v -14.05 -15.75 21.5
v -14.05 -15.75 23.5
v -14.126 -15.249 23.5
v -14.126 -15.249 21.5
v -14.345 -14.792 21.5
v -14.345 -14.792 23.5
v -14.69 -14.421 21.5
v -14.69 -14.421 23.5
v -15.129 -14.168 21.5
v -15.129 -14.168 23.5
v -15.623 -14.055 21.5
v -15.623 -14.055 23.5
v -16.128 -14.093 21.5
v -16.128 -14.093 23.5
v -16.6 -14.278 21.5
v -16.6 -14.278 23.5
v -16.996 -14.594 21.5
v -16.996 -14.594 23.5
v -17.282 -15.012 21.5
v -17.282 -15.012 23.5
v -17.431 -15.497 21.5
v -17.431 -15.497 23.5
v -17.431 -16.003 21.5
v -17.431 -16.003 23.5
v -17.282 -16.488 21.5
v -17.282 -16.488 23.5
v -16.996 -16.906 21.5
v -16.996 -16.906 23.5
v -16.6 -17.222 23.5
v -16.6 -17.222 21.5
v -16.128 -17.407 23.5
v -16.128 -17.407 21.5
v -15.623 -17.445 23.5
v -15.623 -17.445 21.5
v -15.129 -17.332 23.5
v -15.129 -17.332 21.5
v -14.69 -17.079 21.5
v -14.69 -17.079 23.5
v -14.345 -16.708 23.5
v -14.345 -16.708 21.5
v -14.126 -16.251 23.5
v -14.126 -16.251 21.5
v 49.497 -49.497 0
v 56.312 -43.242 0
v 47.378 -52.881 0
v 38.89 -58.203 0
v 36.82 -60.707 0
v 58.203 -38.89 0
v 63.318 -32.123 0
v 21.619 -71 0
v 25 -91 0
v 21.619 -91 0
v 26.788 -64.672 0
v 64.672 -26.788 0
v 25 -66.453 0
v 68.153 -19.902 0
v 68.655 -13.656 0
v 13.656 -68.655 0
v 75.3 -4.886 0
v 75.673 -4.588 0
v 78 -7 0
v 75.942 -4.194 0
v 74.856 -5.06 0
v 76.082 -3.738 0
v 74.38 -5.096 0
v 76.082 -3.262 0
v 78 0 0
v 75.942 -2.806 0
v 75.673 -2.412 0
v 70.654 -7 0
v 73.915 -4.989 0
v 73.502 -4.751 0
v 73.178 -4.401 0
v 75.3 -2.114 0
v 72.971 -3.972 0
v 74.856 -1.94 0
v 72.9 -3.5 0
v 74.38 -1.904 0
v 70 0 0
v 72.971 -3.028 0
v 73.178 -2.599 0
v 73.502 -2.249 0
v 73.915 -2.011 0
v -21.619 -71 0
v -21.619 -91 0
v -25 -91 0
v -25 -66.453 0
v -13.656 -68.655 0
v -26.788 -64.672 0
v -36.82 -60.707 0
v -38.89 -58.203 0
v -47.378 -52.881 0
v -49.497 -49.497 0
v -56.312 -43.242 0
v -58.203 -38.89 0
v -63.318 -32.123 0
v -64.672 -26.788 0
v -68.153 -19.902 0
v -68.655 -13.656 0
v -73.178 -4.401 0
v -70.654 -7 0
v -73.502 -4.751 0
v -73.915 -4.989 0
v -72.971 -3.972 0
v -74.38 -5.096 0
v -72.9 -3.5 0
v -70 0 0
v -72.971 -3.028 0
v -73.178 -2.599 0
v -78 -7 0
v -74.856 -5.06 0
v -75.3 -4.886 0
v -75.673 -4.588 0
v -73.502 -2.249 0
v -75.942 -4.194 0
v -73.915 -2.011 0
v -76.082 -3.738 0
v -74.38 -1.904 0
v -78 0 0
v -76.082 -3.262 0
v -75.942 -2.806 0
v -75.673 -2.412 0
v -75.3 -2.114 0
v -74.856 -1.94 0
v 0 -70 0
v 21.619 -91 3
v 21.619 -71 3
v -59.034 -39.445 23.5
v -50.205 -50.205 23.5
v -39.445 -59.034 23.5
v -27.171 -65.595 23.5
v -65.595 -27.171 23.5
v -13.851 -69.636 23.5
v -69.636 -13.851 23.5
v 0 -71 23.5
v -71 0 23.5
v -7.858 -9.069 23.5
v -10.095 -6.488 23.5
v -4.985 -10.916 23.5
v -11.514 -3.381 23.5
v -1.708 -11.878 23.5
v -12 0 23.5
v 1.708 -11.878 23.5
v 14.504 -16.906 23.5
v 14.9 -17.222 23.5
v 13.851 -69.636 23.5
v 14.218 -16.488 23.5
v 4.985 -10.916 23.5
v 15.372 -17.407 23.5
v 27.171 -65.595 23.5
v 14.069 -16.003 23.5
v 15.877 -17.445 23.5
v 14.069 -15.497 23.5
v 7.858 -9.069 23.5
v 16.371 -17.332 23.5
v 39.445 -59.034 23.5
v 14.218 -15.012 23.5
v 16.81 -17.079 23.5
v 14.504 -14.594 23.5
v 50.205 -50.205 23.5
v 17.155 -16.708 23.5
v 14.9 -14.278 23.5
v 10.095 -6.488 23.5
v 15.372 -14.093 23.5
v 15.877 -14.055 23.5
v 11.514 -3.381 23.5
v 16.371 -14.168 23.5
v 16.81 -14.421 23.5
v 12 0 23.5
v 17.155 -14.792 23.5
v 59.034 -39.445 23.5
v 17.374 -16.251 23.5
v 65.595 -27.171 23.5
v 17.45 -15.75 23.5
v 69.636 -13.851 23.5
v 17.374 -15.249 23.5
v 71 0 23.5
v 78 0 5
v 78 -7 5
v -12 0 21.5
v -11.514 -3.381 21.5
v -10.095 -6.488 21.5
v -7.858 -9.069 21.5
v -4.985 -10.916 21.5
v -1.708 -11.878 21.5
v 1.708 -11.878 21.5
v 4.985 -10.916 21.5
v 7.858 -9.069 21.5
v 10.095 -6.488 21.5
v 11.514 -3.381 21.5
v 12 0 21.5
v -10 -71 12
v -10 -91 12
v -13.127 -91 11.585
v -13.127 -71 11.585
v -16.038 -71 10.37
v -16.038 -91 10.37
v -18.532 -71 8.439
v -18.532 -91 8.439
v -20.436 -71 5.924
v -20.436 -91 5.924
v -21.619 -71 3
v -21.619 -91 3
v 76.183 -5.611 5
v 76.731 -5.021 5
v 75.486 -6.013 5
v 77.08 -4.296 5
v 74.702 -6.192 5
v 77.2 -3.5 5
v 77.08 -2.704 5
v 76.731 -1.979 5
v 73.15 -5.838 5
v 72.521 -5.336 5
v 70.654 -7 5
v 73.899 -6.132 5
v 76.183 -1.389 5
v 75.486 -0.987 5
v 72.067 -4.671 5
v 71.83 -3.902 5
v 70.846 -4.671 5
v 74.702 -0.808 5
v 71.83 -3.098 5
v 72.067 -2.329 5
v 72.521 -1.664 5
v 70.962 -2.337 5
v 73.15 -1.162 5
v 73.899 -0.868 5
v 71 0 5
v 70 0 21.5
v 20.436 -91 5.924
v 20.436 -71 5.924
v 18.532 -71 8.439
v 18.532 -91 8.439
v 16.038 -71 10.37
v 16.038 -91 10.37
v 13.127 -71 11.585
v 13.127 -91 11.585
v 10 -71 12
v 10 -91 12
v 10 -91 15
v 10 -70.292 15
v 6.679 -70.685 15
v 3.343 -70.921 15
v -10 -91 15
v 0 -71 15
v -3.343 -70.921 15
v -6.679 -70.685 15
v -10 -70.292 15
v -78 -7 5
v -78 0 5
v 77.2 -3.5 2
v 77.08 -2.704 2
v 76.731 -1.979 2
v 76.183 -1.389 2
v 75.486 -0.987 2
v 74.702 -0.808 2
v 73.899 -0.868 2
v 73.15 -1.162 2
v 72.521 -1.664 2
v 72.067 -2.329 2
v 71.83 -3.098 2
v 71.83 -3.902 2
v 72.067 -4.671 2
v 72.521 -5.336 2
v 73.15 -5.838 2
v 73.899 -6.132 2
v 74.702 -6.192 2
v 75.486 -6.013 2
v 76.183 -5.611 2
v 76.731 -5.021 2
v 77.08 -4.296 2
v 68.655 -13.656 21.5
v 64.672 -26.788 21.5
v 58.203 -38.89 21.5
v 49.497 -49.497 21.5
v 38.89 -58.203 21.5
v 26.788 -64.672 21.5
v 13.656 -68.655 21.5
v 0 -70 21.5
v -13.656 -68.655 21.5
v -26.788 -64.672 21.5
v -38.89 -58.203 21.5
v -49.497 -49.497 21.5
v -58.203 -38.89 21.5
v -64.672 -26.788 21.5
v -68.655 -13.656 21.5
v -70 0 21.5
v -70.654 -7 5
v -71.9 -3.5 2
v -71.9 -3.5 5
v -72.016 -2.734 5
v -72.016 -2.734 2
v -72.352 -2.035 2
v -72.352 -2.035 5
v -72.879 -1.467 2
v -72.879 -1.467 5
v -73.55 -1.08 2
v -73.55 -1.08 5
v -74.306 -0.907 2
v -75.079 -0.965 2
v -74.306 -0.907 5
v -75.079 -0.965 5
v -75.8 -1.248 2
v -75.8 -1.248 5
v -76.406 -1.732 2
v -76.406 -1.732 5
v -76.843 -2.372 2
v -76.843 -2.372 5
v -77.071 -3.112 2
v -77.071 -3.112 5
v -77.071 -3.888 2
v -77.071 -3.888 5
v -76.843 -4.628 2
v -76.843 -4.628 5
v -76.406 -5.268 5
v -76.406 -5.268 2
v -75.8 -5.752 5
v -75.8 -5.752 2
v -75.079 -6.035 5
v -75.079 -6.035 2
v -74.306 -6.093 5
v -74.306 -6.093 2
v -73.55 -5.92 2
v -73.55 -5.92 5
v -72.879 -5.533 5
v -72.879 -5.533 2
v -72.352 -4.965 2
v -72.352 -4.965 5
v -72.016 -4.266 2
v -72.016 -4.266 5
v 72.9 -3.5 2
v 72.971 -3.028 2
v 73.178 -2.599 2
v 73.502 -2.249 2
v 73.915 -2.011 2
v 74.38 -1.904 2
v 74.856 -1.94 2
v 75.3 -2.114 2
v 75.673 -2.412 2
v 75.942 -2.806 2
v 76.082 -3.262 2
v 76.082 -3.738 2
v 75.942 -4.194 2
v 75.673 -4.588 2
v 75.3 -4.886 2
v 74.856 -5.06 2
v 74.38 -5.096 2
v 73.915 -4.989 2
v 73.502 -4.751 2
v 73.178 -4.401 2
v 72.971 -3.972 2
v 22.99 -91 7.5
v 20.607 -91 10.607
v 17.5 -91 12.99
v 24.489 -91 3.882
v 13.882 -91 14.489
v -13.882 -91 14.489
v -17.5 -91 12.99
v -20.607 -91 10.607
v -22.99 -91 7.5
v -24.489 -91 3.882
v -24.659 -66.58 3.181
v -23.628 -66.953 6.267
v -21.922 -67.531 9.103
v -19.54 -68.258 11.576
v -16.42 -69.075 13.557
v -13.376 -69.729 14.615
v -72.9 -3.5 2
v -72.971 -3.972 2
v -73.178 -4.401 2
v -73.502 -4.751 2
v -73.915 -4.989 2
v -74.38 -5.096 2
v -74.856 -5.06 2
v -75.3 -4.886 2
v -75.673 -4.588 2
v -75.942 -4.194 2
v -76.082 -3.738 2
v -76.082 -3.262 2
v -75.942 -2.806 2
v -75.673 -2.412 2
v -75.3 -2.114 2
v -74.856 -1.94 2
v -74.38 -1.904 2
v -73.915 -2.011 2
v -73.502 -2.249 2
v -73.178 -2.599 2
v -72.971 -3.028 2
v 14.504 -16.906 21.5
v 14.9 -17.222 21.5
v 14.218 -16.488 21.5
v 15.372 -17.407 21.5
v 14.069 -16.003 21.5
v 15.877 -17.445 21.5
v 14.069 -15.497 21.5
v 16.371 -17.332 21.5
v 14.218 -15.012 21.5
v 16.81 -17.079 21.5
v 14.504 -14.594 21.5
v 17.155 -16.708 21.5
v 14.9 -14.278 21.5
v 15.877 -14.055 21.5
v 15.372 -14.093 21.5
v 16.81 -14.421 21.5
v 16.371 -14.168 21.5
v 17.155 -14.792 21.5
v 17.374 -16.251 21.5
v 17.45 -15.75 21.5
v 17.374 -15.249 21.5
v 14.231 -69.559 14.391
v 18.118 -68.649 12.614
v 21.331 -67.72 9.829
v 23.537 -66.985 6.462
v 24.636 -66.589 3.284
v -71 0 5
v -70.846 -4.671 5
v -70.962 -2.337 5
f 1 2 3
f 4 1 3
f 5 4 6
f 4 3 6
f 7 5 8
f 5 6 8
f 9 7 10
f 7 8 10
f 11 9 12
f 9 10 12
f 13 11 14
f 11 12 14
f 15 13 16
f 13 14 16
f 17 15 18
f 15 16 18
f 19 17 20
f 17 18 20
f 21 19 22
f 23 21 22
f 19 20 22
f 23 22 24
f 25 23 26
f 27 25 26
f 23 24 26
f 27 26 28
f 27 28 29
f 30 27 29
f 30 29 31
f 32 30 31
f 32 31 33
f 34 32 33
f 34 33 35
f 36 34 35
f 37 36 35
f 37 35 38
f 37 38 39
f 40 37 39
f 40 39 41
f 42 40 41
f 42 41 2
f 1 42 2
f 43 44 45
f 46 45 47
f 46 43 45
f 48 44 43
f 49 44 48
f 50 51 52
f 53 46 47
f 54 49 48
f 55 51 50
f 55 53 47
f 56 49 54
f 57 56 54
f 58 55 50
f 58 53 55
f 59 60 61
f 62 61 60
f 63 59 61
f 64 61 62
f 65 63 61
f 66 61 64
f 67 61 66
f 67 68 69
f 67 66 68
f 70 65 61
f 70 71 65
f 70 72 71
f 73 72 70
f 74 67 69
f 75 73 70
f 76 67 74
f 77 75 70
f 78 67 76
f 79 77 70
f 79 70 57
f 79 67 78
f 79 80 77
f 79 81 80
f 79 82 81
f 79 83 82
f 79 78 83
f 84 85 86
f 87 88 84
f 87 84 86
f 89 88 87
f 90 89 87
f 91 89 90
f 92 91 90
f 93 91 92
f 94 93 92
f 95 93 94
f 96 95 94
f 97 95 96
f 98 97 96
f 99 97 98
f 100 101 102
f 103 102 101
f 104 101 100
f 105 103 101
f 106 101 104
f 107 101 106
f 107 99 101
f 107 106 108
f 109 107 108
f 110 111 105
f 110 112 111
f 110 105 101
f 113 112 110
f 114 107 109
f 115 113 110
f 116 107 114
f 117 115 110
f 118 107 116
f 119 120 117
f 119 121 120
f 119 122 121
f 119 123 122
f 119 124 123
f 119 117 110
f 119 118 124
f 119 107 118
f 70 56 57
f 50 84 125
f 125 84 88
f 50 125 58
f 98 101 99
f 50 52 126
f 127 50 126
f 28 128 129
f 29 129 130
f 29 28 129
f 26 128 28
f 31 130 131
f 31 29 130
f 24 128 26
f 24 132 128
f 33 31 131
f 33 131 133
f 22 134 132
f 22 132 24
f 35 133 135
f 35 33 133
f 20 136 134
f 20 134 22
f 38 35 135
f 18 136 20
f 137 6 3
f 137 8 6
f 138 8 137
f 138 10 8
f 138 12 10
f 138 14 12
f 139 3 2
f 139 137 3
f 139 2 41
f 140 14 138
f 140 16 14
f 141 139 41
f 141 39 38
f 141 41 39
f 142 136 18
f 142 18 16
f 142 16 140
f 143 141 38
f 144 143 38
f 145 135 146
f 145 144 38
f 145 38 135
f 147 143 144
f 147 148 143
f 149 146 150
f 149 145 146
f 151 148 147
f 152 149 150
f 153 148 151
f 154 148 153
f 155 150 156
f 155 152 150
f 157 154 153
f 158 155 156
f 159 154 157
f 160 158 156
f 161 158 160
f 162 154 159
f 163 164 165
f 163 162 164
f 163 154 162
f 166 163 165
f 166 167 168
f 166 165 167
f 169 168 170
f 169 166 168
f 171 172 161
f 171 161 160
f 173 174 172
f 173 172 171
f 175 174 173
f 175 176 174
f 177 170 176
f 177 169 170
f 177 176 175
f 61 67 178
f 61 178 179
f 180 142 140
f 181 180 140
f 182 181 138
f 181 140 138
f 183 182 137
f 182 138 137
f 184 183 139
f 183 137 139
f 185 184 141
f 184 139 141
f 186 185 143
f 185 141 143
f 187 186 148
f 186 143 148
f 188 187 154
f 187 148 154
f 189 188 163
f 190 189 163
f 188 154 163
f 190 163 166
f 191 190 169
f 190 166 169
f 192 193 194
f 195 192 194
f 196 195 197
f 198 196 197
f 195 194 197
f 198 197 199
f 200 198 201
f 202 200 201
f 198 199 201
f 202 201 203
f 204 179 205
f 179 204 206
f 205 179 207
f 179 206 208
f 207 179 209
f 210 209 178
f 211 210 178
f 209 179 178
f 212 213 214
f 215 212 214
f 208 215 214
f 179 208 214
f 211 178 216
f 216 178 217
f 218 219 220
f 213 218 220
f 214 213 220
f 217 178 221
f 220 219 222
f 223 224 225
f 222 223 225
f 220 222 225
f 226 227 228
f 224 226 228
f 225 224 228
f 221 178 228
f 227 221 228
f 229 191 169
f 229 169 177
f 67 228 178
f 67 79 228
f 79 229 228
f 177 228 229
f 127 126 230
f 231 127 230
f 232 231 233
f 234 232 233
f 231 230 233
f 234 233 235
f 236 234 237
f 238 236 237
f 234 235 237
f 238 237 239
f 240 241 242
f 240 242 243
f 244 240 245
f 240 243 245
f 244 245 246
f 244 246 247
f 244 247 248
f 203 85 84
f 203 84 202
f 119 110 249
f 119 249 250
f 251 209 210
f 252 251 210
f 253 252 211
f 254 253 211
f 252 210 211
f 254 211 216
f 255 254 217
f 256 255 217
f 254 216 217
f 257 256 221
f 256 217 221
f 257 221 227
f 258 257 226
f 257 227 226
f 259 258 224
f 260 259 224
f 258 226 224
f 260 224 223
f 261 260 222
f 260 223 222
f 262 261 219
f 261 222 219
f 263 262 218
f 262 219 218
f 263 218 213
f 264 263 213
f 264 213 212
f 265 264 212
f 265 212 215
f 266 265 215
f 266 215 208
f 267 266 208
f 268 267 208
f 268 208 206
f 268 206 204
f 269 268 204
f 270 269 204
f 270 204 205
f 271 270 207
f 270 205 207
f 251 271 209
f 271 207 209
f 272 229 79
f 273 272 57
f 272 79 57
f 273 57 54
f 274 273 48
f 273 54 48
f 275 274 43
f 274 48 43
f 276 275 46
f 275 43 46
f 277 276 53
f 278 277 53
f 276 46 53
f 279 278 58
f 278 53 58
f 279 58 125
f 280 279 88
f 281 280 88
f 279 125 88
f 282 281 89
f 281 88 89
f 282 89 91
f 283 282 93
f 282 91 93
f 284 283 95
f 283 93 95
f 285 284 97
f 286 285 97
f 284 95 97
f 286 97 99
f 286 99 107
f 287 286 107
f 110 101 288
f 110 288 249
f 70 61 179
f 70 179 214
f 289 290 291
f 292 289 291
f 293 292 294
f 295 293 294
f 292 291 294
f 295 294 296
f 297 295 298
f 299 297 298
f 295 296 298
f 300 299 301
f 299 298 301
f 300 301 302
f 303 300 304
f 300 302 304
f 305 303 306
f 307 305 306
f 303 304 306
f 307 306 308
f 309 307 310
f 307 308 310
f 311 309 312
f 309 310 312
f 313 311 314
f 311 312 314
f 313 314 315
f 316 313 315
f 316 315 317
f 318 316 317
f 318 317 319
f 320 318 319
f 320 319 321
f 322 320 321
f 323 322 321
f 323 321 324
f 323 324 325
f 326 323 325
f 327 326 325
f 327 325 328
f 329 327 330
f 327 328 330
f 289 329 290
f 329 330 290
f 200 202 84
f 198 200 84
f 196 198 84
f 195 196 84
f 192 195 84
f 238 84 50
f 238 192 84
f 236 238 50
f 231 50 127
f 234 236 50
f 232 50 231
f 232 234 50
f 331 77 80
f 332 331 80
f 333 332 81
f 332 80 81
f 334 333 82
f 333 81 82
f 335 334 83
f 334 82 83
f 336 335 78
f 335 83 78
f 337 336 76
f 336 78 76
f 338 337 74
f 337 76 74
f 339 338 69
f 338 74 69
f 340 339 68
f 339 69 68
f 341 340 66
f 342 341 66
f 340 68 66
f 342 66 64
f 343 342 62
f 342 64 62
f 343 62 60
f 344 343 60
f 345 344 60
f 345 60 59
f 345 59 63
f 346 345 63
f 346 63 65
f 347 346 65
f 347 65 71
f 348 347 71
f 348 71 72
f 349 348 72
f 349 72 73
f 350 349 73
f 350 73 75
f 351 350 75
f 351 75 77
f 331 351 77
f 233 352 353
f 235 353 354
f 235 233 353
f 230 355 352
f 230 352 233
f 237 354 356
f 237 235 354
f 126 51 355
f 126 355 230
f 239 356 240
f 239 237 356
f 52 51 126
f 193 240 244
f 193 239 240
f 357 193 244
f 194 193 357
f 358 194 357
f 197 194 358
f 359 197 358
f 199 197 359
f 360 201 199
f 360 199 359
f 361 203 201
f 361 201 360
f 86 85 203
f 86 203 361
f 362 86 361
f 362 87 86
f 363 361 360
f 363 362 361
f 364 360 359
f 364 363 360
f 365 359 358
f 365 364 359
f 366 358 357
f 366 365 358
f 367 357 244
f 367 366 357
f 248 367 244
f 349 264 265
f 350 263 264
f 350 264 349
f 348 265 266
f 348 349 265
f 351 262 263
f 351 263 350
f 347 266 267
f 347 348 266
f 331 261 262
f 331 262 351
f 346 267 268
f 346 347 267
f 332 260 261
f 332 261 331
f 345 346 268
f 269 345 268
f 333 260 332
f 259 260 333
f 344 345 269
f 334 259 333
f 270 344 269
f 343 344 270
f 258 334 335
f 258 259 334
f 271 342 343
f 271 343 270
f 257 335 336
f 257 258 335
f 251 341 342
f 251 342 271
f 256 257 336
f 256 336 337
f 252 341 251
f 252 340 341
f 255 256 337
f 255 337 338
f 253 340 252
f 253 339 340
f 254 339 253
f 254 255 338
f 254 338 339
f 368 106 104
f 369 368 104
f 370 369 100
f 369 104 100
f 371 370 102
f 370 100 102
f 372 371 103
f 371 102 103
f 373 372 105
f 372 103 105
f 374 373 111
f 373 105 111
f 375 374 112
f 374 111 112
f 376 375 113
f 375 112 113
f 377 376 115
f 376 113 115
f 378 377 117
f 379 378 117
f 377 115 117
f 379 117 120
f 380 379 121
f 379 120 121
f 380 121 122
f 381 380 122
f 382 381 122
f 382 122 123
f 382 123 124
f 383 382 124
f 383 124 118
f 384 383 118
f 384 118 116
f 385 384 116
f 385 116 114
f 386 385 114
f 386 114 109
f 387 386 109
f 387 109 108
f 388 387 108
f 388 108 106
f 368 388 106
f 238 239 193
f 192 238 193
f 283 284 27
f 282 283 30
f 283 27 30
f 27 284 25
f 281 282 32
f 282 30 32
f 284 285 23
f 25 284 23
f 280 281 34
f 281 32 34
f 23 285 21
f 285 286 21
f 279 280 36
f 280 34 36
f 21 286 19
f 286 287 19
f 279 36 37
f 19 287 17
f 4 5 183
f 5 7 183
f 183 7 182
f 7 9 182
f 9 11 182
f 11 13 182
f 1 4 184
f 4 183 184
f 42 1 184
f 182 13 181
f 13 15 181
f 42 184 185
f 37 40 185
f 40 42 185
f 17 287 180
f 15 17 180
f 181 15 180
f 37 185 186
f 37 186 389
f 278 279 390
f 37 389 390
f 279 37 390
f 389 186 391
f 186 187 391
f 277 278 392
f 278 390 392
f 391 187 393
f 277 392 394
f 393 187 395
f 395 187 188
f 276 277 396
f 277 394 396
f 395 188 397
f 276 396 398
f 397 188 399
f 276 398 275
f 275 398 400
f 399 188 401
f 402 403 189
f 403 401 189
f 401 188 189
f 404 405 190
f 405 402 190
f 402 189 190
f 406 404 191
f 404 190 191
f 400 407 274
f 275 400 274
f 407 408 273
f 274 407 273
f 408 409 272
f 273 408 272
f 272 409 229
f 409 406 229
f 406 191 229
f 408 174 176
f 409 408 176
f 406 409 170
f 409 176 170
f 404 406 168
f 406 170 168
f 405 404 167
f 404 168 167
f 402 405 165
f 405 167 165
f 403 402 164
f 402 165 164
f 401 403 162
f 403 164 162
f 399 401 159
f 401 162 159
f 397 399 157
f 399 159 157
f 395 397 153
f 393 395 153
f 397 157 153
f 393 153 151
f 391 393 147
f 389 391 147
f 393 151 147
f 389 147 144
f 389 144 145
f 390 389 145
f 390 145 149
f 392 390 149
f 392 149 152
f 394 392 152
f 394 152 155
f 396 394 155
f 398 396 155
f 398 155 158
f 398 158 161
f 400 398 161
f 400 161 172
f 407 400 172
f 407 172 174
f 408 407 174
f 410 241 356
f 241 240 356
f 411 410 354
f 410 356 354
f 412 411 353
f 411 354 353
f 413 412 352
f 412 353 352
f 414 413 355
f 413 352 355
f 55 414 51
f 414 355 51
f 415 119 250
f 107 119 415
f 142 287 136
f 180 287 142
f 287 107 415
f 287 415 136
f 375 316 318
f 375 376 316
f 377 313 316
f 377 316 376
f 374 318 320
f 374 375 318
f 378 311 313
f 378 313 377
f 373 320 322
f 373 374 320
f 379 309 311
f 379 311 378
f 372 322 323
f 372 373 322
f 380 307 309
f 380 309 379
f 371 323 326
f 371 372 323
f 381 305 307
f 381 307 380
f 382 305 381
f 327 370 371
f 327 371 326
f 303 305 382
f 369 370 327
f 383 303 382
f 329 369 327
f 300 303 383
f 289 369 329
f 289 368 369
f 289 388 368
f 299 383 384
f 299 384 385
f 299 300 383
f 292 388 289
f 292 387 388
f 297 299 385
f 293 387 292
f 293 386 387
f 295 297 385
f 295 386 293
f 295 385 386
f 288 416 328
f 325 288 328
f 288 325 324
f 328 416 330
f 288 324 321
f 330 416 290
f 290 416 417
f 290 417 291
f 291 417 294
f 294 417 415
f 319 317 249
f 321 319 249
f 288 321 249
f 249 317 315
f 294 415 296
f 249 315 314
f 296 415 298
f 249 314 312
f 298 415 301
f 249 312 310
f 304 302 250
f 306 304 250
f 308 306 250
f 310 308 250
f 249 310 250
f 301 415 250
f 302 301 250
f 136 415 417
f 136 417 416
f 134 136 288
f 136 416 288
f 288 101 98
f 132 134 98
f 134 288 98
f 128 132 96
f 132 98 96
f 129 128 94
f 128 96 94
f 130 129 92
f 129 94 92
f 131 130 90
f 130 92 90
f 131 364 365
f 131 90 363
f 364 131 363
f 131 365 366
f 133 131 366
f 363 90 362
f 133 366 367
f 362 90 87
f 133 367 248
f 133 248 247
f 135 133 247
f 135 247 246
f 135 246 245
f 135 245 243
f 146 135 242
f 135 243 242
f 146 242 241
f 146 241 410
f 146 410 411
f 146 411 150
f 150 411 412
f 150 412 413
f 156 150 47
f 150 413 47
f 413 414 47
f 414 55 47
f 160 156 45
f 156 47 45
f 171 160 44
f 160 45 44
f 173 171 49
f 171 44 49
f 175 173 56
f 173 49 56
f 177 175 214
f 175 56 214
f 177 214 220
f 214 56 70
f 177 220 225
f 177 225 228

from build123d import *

# Parameters (mm, degrees)
BOSS_EXTRUDE1_DEPTH = 21.5
BOSS_EXTRUDE2_DEPTH = 2
SKETCH3_W           = 50
SKETCH3_H           = 20
BOSS_EXTRUDE3_DEPTH = 15
SKETCH8_R           = 1.6
BOSS_EXTRUDE5_DEPTH = 5
SKETCH10_R          = 2.7
SKETCH10_R_2        = 2.6
CUT_EXTRUDE5_DEPTH  = 3
FILLET2_R           = 15
SKETCH11_W          = 43.237900078
SKETCH11_H          = 3
CUT_EXTRUDE7_DEPTH  = 20
SKETCH13_R          = 1.7
CUT_EXTRUDE8_DEPTH  = 10
SKETCH14_R          = 12
CUT_EXTRUDE9_DEPTH  = 10


with BuildPart() as part:
    # Sketch1 → Boss-Extrude1 (new body)
    with BuildSketch(Plane.XY):
        with BuildLine():
            Line((71, 0), (70, 0))
            ThreePointArc((70, 0), (0, -70), (-70, 0))
            Line((-70, 0), (-71, 0))
            ThreePointArc((-71, 0), (0, -71), (71, 0))
        make_face()
    extrude(amount=BOSS_EXTRUDE1_DEPTH)

    # Sketch2 → Boss-Extrude2 (add)
    with BuildSketch(Plane.XY.offset(21.5)):
        with BuildLine():
            Line((71, 0), (70, 0))
            ThreePointArc((70, 0), (0, -70), (-70, 0))
            Line((-70, 0), (-71, 0))
            ThreePointArc((-71, 0), (0, -71), (71, 0))
        make_face()
        with BuildLine():
            Line((-21.5, 0), (-70, 0))
            ThreePointArc((-70, 0), (0, -70), (70, 0))
            Line((70, 0), (21.5, 0))
            Line((21.5, 0), (-21.5, 0))
        make_face()
    extrude(amount=BOSS_EXTRUDE2_DEPTH)

    # Sketch3 → Boss-Extrude3 (add)
    with BuildSketch(Plane(origin=(0, 0, 0), x_dir=(-1, 0, 0), z_dir=(0, 0, -1))):
        with BuildLine():
            Line((-25, -66.452990903), (-25, -71))
            Line((-25, -71), (0, -71))
            ThreePointArc((0, -71), (-12.705070757, -69.853999006), (-25, -66.452990903))
        make_face()
        with BuildLine():
            ThreePointArc((25, -66.452990903), (12.705070757, -69.853999006), (0, -71))
            Line((0, -71), (25, -71))
            Line((25, -71), (25, -66.452990903))
        make_face()
        with Locations((0, -81)):
            Rectangle(SKETCH3_W, SKETCH3_H)
    extrude(amount=-BOSS_EXTRUDE3_DEPTH)

    # Sketch8 → Boss-Extrude5 (add)
    # profile 1 of 2: a face of its own
    with BuildSketch(Plane(origin=(0, 0, 0), x_dir=(-1, 0, 0), z_dir=(0, 0, -1))):
        with BuildLine():
            ThreePointArc((-70.654086931, -7), (-70.913469003, -3.504270818), (-71, 0))
            Line((-71, 0), (-78, 0))
            Line((-78, 0), (-78, -7))
            Line((-78, -7), (-70.654086931, -7))
        make_face()
        with Locations((-74.5, -3.5)):
            Circle(SKETCH8_R, mode=Mode.SUBTRACT)
    # profile 2 of 2: a face of its own
    with BuildSketch(Plane(origin=(0, 0, 0), x_dir=(-1, 0, 0), z_dir=(0, 0, -1))):
        with BuildLine():
            Line((78, 0), (71, 0))
            ThreePointArc((71, 0), (70.913469003, -3.504270818), (70.654086931, -7))
            Line((70.654086931, -7), (78, -7))
            Line((78, -7), (78, 0))
        make_face()
        with Locations(Location((74.5, -3.5, 0), (0, 0, 180))):
            Circle(SKETCH8_R, mode=Mode.SUBTRACT)
    extrude(amount=-BOSS_EXTRUDE5_DEPTH)

    # Sketch10 → Cut-Extrude5 (cut)
    with BuildSketch(Plane.XY.offset(5)):
        with Locations((74.5, -3.5)):
            Circle(SKETCH10_R)
        with Locations((-74.5, -3.5)):
            Circle(SKETCH10_R_2)
    extrude(amount=-CUT_EXTRUDE5_DEPTH, mode=Mode.SUBTRACT)

    # Fillet2
    fillet2_edges = [part.edges().sort_by_distance(p)[0] for p in [
        (-25, -78.726495452, 15),
        (25, -78.726495452, 15),
    ]]
    fillet(fillet2_edges, radius=FILLET2_R - 0.0001)  # a hair under: the kernel refuses the full size

    # Sketch11 → Cut-Extrude7 (cut)
    with BuildSketch(Plane.XZ.offset(91)):
        with Locations((0, 1.5)):
            Rectangle(SKETCH11_W, SKETCH11_H)
        with BuildLine():
            Line((-21.618950039, 3), (21.618950039, 3))
            ThreePointArc((21.618950039, 3), (17.348469228, 9.486832981), (10, 12))
            Line((10, 12), (-10, 12))
            ThreePointArc((-10, 12), (-17.348469228, 9.486832981), (-21.618950039, 3))
        make_face()
    extrude(amount=-CUT_EXTRUDE7_DEPTH, mode=Mode.SUBTRACT)

    # Sketch13 → Cut-Extrude8 (cut)
    with BuildSketch(Plane.XY.offset(23.5)):
        with Locations((-15.75, -15.75)):
            Circle(SKETCH13_R)
        with Locations((15.75, -15.75)):
            Circle(SKETCH13_R)
    extrude(amount=-CUT_EXTRUDE8_DEPTH, mode=Mode.SUBTRACT)

    # Sketch14 → Cut-Extrude9 (cut)
    with BuildSketch(Plane.XY.offset(23.5)):
        Circle(SKETCH14_R)
    extrude(amount=-CUT_EXTRUDE9_DEPTH, mode=Mode.SUBTRACT)


solid = part.part
